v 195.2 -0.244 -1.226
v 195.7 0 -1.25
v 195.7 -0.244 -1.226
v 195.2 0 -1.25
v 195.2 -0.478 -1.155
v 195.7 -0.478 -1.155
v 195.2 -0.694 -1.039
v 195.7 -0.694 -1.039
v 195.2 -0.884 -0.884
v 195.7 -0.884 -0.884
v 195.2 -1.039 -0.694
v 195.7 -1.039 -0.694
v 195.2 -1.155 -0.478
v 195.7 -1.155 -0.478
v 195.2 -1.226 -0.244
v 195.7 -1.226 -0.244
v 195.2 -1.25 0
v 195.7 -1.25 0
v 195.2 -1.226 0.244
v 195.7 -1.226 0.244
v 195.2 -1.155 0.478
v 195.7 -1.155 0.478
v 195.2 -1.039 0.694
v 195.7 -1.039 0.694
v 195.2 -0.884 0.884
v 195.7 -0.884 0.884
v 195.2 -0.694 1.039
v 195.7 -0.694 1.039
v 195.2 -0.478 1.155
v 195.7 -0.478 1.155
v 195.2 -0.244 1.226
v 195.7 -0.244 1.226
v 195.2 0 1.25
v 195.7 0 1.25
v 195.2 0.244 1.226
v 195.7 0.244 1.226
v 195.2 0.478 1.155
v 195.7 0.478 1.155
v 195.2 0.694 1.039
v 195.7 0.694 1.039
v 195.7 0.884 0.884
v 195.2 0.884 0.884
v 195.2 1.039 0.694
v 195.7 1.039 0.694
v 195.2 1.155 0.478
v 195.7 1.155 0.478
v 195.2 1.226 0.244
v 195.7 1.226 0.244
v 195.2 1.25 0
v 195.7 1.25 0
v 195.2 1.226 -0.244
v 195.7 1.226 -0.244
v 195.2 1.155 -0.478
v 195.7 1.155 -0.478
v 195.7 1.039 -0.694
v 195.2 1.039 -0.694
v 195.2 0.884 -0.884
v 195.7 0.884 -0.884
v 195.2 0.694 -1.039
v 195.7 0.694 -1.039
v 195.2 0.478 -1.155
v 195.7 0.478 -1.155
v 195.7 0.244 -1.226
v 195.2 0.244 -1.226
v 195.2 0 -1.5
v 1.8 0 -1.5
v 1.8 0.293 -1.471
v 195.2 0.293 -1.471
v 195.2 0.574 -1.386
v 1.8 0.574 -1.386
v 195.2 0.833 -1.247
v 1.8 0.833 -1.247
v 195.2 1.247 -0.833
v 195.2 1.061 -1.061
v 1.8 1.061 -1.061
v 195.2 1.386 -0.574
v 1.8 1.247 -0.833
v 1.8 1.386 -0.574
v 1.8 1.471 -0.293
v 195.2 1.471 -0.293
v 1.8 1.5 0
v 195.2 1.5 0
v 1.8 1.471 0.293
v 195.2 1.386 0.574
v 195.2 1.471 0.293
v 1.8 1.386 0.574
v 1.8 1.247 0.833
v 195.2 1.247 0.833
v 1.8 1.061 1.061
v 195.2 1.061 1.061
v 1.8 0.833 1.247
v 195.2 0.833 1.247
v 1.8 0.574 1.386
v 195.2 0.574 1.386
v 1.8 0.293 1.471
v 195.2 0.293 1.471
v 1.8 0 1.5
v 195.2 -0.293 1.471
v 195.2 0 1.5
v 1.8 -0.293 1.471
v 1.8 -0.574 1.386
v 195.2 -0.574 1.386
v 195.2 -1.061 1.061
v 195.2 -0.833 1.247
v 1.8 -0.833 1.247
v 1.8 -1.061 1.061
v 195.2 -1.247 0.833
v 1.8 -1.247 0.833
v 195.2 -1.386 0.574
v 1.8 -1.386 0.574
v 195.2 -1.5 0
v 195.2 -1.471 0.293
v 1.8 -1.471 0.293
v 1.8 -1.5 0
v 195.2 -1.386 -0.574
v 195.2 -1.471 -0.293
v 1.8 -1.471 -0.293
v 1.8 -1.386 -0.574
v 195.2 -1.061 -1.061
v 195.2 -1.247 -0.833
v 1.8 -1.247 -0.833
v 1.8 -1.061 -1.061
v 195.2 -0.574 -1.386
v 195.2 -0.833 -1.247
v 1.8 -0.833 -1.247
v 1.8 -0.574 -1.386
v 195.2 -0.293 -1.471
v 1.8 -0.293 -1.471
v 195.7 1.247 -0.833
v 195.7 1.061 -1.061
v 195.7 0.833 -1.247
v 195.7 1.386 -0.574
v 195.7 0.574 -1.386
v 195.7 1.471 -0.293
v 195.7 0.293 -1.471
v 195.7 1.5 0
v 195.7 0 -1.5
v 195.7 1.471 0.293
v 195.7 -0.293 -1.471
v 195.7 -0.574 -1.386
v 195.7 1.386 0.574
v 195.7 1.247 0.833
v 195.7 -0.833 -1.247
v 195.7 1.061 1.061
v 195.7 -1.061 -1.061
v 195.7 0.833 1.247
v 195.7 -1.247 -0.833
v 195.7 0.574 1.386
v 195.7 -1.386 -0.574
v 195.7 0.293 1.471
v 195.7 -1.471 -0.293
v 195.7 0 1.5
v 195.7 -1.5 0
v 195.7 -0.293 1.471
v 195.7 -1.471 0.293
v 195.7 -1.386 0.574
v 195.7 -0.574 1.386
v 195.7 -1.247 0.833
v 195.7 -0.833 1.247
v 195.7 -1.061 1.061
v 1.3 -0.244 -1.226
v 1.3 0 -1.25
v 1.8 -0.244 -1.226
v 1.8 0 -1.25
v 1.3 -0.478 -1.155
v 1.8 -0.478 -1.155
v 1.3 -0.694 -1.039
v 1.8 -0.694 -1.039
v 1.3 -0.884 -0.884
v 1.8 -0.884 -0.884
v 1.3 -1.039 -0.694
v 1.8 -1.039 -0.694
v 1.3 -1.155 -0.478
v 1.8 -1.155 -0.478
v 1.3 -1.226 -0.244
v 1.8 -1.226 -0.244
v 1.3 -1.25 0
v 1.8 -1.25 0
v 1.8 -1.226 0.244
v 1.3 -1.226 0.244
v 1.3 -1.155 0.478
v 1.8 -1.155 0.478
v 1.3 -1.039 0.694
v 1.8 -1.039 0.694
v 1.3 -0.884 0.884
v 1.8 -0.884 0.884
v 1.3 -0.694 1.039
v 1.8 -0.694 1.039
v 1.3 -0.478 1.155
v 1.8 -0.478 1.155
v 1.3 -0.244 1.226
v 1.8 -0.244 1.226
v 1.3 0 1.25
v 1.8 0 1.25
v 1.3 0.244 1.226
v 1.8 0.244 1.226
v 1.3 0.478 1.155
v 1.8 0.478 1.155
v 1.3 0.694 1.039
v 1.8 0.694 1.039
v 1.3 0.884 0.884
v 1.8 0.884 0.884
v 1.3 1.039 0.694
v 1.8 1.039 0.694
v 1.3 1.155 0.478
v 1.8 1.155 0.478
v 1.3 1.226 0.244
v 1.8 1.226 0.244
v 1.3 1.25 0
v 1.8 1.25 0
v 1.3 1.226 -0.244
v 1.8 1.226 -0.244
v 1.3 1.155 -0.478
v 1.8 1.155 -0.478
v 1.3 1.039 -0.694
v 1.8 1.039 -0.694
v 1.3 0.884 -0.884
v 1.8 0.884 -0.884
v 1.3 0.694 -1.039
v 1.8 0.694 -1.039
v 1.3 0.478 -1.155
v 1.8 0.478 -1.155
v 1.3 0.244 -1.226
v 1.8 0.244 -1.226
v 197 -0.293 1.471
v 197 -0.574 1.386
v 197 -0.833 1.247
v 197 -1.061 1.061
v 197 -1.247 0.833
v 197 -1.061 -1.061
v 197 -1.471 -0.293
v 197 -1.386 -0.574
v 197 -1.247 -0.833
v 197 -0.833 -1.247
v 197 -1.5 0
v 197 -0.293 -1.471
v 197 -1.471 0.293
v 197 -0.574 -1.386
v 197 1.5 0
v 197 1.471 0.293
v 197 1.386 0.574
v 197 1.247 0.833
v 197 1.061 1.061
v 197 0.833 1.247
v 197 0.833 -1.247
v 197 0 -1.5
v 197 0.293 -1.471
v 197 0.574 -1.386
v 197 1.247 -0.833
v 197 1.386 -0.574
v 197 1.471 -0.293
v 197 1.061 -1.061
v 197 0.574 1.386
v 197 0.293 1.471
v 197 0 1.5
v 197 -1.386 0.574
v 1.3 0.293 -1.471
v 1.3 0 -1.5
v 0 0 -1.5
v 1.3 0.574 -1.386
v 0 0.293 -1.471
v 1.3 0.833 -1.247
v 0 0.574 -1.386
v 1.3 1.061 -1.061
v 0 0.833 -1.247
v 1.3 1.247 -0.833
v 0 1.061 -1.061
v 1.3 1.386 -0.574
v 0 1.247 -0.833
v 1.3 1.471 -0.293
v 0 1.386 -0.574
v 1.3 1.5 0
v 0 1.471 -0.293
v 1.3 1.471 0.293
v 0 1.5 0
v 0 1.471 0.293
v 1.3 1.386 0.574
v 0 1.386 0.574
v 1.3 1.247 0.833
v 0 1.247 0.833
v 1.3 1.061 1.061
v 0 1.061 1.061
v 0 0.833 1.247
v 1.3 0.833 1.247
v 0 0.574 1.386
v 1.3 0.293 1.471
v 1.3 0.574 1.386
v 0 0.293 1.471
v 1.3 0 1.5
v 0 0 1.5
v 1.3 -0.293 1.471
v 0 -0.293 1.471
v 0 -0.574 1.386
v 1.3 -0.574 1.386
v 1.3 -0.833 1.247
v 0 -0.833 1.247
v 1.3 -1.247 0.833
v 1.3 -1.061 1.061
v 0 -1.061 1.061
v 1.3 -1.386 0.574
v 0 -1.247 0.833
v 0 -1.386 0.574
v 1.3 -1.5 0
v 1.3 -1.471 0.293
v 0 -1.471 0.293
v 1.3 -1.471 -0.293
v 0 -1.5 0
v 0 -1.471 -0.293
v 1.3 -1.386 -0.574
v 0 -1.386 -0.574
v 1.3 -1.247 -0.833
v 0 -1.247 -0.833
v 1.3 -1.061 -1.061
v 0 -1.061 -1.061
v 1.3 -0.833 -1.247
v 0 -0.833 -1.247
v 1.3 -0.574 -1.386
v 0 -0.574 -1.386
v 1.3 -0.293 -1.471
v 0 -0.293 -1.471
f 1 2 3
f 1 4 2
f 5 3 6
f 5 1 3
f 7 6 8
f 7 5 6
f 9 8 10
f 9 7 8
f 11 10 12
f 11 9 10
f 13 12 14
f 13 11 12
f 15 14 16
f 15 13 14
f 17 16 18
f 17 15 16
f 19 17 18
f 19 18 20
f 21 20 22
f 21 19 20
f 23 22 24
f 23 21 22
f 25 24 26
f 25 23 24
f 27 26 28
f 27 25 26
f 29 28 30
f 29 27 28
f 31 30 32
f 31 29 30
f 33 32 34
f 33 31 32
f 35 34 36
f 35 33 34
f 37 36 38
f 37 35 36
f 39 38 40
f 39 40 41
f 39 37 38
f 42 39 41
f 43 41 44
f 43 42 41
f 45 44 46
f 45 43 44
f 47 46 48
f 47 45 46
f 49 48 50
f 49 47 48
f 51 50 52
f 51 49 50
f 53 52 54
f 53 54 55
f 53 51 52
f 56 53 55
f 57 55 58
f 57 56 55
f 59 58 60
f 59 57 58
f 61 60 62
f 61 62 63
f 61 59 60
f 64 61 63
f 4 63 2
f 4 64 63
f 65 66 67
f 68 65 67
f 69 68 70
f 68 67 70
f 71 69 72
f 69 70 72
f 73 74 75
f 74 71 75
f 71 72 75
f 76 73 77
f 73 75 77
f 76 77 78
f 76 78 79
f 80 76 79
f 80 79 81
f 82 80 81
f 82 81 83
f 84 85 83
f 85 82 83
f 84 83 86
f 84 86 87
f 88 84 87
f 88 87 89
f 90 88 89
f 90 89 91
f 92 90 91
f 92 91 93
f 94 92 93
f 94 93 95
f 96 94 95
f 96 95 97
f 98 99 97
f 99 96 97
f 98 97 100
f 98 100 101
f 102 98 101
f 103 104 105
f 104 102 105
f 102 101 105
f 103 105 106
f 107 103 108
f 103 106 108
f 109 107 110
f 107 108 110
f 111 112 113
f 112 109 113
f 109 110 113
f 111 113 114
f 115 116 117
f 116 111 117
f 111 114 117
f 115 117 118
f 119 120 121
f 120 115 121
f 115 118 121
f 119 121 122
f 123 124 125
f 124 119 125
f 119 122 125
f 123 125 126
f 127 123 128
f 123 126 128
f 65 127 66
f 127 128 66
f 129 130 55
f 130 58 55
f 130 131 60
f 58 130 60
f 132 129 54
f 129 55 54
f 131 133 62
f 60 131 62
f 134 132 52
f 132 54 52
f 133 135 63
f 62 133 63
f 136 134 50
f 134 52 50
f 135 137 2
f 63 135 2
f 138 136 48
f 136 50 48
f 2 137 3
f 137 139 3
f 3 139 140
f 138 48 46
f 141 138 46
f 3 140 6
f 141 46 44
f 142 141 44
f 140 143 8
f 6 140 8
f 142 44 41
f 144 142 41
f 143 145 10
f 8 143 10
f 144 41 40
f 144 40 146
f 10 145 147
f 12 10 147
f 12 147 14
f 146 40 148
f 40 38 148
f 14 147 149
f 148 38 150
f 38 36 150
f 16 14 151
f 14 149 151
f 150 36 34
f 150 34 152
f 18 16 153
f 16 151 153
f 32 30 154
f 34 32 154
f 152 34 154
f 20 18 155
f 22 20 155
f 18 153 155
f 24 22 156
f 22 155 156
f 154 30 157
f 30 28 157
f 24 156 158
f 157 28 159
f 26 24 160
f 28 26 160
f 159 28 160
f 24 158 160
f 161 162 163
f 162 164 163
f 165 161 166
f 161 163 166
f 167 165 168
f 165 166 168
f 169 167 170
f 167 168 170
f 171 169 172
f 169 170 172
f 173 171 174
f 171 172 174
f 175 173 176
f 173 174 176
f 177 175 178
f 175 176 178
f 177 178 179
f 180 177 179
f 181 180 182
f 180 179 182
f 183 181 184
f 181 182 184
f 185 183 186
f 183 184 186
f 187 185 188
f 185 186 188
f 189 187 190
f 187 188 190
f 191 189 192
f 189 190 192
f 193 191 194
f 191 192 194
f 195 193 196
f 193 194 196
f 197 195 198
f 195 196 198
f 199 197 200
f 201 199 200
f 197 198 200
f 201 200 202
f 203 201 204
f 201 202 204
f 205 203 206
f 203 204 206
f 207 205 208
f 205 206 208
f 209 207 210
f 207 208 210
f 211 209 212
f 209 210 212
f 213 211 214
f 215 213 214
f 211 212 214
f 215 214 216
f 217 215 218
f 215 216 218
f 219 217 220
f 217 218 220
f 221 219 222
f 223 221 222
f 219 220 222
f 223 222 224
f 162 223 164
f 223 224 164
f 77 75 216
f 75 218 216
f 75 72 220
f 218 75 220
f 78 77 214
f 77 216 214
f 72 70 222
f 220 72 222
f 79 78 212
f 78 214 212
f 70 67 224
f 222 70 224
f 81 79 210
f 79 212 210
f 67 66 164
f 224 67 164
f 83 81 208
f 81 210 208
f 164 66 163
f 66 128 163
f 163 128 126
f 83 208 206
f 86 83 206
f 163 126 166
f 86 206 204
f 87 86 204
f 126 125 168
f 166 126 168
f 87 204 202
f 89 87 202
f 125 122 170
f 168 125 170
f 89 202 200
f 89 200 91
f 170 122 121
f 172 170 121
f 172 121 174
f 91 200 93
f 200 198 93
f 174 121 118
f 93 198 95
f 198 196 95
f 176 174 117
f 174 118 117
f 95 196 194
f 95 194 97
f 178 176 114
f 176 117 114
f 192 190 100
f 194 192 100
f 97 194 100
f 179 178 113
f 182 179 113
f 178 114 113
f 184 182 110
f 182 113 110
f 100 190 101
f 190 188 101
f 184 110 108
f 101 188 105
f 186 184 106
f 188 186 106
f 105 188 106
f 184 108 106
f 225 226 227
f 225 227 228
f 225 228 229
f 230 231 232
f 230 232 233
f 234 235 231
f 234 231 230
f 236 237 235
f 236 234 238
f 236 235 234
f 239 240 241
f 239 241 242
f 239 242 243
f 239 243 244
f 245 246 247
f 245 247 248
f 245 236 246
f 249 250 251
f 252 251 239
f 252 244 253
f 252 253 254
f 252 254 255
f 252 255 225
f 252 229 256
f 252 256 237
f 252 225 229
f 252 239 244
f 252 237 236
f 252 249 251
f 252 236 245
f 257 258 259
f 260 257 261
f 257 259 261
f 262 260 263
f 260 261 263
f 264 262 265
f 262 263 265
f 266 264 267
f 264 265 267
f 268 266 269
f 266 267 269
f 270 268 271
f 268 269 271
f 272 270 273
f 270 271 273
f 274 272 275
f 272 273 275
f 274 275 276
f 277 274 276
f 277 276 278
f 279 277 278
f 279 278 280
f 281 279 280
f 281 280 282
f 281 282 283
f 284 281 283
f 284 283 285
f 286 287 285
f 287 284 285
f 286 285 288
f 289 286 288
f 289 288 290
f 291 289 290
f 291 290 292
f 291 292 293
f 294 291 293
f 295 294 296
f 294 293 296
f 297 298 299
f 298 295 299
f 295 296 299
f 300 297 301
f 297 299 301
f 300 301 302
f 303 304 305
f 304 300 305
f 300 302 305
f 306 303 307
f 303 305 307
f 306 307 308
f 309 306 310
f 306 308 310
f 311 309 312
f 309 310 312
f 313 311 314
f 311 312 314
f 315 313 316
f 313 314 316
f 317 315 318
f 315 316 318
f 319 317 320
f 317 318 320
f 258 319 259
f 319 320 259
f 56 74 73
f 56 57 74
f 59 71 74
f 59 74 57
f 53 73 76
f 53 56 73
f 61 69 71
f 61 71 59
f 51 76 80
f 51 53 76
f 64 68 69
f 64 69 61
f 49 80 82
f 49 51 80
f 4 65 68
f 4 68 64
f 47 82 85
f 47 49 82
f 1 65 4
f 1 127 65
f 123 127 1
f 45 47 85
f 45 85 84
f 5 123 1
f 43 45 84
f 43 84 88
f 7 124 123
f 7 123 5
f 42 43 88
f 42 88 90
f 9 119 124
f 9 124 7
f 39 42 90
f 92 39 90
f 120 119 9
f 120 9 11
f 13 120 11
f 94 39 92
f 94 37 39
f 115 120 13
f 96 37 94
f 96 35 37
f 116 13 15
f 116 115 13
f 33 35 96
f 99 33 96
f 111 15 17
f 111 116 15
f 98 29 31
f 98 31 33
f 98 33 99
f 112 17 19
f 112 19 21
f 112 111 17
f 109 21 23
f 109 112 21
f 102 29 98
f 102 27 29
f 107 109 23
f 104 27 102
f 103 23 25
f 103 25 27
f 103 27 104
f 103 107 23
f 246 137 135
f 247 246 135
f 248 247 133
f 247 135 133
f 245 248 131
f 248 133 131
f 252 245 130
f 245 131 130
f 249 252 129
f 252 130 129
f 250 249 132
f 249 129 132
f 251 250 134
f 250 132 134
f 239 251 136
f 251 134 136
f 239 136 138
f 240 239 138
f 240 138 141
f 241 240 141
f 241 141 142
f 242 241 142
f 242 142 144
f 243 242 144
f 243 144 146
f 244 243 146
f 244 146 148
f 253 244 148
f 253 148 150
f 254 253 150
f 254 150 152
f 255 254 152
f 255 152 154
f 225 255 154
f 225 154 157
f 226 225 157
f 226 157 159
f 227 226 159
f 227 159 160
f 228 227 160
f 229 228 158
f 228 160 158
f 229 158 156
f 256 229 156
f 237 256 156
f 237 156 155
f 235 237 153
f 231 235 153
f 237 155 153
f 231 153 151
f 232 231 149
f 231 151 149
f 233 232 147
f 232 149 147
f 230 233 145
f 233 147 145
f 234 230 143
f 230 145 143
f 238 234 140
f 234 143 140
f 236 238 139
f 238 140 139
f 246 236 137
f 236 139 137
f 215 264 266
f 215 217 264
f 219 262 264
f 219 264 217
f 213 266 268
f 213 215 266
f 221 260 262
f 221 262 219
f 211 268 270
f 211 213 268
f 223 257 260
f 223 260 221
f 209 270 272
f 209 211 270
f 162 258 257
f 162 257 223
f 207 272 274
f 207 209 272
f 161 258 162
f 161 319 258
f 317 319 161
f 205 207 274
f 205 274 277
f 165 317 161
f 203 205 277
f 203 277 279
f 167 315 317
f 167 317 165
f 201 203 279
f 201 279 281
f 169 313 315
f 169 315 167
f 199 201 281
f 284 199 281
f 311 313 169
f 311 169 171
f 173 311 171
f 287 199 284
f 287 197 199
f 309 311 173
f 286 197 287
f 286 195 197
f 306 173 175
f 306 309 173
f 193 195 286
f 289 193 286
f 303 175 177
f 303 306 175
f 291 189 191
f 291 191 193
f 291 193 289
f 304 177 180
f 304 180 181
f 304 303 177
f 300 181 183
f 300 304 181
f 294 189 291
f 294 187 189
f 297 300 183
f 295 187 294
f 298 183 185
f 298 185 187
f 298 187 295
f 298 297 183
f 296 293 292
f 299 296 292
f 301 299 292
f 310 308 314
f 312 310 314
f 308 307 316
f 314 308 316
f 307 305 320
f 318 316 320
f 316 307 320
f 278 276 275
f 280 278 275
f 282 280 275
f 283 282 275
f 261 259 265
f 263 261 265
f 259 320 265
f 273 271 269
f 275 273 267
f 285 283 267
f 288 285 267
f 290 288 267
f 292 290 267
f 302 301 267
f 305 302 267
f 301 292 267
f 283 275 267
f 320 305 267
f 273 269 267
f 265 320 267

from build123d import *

# Parameters (mm, degrees)
SKETCH1_R           = 1.5
BOSS_EXTRUDE1_DEPTH = 197
SKETCH2_W           = 0.5
SKETCH2_H           = 0.25


with BuildPart() as part:
    # Sketch1 → Boss-Extrude1 (new body)
    with BuildSketch(Plane(origin=(0, 0, 0), x_dir=(0, 0, -1), z_dir=(1, 0, 0))):
        Circle(SKETCH1_R)
    extrude(amount=BOSS_EXTRUDE1_DEPTH)

    # Sketch2 → Cut-Revolve1 (revolve, cut)
    with BuildSketch(Plane.XY, mode=Mode.PRIVATE) as cut_revolve1_sk:
        with Locations((1.55, 1.375)):
            Rectangle(SKETCH2_W, SKETCH2_H)
    cut_revolve1 = revolve(cut_revolve1_sk.sketch.rotate(Axis((197, 0, 0), (-1, 0, 0)), 90), axis=Axis((197, 0, 0), (-1, 0, 0)), mode=Mode.SUBTRACT)

    # Mirror1: Cut-Revolve1 across plane
    add(cut_revolve1.mirror(Plane.ZY.offset(-98.5)), mode=Mode.SUBTRACT)


solid = part.part
